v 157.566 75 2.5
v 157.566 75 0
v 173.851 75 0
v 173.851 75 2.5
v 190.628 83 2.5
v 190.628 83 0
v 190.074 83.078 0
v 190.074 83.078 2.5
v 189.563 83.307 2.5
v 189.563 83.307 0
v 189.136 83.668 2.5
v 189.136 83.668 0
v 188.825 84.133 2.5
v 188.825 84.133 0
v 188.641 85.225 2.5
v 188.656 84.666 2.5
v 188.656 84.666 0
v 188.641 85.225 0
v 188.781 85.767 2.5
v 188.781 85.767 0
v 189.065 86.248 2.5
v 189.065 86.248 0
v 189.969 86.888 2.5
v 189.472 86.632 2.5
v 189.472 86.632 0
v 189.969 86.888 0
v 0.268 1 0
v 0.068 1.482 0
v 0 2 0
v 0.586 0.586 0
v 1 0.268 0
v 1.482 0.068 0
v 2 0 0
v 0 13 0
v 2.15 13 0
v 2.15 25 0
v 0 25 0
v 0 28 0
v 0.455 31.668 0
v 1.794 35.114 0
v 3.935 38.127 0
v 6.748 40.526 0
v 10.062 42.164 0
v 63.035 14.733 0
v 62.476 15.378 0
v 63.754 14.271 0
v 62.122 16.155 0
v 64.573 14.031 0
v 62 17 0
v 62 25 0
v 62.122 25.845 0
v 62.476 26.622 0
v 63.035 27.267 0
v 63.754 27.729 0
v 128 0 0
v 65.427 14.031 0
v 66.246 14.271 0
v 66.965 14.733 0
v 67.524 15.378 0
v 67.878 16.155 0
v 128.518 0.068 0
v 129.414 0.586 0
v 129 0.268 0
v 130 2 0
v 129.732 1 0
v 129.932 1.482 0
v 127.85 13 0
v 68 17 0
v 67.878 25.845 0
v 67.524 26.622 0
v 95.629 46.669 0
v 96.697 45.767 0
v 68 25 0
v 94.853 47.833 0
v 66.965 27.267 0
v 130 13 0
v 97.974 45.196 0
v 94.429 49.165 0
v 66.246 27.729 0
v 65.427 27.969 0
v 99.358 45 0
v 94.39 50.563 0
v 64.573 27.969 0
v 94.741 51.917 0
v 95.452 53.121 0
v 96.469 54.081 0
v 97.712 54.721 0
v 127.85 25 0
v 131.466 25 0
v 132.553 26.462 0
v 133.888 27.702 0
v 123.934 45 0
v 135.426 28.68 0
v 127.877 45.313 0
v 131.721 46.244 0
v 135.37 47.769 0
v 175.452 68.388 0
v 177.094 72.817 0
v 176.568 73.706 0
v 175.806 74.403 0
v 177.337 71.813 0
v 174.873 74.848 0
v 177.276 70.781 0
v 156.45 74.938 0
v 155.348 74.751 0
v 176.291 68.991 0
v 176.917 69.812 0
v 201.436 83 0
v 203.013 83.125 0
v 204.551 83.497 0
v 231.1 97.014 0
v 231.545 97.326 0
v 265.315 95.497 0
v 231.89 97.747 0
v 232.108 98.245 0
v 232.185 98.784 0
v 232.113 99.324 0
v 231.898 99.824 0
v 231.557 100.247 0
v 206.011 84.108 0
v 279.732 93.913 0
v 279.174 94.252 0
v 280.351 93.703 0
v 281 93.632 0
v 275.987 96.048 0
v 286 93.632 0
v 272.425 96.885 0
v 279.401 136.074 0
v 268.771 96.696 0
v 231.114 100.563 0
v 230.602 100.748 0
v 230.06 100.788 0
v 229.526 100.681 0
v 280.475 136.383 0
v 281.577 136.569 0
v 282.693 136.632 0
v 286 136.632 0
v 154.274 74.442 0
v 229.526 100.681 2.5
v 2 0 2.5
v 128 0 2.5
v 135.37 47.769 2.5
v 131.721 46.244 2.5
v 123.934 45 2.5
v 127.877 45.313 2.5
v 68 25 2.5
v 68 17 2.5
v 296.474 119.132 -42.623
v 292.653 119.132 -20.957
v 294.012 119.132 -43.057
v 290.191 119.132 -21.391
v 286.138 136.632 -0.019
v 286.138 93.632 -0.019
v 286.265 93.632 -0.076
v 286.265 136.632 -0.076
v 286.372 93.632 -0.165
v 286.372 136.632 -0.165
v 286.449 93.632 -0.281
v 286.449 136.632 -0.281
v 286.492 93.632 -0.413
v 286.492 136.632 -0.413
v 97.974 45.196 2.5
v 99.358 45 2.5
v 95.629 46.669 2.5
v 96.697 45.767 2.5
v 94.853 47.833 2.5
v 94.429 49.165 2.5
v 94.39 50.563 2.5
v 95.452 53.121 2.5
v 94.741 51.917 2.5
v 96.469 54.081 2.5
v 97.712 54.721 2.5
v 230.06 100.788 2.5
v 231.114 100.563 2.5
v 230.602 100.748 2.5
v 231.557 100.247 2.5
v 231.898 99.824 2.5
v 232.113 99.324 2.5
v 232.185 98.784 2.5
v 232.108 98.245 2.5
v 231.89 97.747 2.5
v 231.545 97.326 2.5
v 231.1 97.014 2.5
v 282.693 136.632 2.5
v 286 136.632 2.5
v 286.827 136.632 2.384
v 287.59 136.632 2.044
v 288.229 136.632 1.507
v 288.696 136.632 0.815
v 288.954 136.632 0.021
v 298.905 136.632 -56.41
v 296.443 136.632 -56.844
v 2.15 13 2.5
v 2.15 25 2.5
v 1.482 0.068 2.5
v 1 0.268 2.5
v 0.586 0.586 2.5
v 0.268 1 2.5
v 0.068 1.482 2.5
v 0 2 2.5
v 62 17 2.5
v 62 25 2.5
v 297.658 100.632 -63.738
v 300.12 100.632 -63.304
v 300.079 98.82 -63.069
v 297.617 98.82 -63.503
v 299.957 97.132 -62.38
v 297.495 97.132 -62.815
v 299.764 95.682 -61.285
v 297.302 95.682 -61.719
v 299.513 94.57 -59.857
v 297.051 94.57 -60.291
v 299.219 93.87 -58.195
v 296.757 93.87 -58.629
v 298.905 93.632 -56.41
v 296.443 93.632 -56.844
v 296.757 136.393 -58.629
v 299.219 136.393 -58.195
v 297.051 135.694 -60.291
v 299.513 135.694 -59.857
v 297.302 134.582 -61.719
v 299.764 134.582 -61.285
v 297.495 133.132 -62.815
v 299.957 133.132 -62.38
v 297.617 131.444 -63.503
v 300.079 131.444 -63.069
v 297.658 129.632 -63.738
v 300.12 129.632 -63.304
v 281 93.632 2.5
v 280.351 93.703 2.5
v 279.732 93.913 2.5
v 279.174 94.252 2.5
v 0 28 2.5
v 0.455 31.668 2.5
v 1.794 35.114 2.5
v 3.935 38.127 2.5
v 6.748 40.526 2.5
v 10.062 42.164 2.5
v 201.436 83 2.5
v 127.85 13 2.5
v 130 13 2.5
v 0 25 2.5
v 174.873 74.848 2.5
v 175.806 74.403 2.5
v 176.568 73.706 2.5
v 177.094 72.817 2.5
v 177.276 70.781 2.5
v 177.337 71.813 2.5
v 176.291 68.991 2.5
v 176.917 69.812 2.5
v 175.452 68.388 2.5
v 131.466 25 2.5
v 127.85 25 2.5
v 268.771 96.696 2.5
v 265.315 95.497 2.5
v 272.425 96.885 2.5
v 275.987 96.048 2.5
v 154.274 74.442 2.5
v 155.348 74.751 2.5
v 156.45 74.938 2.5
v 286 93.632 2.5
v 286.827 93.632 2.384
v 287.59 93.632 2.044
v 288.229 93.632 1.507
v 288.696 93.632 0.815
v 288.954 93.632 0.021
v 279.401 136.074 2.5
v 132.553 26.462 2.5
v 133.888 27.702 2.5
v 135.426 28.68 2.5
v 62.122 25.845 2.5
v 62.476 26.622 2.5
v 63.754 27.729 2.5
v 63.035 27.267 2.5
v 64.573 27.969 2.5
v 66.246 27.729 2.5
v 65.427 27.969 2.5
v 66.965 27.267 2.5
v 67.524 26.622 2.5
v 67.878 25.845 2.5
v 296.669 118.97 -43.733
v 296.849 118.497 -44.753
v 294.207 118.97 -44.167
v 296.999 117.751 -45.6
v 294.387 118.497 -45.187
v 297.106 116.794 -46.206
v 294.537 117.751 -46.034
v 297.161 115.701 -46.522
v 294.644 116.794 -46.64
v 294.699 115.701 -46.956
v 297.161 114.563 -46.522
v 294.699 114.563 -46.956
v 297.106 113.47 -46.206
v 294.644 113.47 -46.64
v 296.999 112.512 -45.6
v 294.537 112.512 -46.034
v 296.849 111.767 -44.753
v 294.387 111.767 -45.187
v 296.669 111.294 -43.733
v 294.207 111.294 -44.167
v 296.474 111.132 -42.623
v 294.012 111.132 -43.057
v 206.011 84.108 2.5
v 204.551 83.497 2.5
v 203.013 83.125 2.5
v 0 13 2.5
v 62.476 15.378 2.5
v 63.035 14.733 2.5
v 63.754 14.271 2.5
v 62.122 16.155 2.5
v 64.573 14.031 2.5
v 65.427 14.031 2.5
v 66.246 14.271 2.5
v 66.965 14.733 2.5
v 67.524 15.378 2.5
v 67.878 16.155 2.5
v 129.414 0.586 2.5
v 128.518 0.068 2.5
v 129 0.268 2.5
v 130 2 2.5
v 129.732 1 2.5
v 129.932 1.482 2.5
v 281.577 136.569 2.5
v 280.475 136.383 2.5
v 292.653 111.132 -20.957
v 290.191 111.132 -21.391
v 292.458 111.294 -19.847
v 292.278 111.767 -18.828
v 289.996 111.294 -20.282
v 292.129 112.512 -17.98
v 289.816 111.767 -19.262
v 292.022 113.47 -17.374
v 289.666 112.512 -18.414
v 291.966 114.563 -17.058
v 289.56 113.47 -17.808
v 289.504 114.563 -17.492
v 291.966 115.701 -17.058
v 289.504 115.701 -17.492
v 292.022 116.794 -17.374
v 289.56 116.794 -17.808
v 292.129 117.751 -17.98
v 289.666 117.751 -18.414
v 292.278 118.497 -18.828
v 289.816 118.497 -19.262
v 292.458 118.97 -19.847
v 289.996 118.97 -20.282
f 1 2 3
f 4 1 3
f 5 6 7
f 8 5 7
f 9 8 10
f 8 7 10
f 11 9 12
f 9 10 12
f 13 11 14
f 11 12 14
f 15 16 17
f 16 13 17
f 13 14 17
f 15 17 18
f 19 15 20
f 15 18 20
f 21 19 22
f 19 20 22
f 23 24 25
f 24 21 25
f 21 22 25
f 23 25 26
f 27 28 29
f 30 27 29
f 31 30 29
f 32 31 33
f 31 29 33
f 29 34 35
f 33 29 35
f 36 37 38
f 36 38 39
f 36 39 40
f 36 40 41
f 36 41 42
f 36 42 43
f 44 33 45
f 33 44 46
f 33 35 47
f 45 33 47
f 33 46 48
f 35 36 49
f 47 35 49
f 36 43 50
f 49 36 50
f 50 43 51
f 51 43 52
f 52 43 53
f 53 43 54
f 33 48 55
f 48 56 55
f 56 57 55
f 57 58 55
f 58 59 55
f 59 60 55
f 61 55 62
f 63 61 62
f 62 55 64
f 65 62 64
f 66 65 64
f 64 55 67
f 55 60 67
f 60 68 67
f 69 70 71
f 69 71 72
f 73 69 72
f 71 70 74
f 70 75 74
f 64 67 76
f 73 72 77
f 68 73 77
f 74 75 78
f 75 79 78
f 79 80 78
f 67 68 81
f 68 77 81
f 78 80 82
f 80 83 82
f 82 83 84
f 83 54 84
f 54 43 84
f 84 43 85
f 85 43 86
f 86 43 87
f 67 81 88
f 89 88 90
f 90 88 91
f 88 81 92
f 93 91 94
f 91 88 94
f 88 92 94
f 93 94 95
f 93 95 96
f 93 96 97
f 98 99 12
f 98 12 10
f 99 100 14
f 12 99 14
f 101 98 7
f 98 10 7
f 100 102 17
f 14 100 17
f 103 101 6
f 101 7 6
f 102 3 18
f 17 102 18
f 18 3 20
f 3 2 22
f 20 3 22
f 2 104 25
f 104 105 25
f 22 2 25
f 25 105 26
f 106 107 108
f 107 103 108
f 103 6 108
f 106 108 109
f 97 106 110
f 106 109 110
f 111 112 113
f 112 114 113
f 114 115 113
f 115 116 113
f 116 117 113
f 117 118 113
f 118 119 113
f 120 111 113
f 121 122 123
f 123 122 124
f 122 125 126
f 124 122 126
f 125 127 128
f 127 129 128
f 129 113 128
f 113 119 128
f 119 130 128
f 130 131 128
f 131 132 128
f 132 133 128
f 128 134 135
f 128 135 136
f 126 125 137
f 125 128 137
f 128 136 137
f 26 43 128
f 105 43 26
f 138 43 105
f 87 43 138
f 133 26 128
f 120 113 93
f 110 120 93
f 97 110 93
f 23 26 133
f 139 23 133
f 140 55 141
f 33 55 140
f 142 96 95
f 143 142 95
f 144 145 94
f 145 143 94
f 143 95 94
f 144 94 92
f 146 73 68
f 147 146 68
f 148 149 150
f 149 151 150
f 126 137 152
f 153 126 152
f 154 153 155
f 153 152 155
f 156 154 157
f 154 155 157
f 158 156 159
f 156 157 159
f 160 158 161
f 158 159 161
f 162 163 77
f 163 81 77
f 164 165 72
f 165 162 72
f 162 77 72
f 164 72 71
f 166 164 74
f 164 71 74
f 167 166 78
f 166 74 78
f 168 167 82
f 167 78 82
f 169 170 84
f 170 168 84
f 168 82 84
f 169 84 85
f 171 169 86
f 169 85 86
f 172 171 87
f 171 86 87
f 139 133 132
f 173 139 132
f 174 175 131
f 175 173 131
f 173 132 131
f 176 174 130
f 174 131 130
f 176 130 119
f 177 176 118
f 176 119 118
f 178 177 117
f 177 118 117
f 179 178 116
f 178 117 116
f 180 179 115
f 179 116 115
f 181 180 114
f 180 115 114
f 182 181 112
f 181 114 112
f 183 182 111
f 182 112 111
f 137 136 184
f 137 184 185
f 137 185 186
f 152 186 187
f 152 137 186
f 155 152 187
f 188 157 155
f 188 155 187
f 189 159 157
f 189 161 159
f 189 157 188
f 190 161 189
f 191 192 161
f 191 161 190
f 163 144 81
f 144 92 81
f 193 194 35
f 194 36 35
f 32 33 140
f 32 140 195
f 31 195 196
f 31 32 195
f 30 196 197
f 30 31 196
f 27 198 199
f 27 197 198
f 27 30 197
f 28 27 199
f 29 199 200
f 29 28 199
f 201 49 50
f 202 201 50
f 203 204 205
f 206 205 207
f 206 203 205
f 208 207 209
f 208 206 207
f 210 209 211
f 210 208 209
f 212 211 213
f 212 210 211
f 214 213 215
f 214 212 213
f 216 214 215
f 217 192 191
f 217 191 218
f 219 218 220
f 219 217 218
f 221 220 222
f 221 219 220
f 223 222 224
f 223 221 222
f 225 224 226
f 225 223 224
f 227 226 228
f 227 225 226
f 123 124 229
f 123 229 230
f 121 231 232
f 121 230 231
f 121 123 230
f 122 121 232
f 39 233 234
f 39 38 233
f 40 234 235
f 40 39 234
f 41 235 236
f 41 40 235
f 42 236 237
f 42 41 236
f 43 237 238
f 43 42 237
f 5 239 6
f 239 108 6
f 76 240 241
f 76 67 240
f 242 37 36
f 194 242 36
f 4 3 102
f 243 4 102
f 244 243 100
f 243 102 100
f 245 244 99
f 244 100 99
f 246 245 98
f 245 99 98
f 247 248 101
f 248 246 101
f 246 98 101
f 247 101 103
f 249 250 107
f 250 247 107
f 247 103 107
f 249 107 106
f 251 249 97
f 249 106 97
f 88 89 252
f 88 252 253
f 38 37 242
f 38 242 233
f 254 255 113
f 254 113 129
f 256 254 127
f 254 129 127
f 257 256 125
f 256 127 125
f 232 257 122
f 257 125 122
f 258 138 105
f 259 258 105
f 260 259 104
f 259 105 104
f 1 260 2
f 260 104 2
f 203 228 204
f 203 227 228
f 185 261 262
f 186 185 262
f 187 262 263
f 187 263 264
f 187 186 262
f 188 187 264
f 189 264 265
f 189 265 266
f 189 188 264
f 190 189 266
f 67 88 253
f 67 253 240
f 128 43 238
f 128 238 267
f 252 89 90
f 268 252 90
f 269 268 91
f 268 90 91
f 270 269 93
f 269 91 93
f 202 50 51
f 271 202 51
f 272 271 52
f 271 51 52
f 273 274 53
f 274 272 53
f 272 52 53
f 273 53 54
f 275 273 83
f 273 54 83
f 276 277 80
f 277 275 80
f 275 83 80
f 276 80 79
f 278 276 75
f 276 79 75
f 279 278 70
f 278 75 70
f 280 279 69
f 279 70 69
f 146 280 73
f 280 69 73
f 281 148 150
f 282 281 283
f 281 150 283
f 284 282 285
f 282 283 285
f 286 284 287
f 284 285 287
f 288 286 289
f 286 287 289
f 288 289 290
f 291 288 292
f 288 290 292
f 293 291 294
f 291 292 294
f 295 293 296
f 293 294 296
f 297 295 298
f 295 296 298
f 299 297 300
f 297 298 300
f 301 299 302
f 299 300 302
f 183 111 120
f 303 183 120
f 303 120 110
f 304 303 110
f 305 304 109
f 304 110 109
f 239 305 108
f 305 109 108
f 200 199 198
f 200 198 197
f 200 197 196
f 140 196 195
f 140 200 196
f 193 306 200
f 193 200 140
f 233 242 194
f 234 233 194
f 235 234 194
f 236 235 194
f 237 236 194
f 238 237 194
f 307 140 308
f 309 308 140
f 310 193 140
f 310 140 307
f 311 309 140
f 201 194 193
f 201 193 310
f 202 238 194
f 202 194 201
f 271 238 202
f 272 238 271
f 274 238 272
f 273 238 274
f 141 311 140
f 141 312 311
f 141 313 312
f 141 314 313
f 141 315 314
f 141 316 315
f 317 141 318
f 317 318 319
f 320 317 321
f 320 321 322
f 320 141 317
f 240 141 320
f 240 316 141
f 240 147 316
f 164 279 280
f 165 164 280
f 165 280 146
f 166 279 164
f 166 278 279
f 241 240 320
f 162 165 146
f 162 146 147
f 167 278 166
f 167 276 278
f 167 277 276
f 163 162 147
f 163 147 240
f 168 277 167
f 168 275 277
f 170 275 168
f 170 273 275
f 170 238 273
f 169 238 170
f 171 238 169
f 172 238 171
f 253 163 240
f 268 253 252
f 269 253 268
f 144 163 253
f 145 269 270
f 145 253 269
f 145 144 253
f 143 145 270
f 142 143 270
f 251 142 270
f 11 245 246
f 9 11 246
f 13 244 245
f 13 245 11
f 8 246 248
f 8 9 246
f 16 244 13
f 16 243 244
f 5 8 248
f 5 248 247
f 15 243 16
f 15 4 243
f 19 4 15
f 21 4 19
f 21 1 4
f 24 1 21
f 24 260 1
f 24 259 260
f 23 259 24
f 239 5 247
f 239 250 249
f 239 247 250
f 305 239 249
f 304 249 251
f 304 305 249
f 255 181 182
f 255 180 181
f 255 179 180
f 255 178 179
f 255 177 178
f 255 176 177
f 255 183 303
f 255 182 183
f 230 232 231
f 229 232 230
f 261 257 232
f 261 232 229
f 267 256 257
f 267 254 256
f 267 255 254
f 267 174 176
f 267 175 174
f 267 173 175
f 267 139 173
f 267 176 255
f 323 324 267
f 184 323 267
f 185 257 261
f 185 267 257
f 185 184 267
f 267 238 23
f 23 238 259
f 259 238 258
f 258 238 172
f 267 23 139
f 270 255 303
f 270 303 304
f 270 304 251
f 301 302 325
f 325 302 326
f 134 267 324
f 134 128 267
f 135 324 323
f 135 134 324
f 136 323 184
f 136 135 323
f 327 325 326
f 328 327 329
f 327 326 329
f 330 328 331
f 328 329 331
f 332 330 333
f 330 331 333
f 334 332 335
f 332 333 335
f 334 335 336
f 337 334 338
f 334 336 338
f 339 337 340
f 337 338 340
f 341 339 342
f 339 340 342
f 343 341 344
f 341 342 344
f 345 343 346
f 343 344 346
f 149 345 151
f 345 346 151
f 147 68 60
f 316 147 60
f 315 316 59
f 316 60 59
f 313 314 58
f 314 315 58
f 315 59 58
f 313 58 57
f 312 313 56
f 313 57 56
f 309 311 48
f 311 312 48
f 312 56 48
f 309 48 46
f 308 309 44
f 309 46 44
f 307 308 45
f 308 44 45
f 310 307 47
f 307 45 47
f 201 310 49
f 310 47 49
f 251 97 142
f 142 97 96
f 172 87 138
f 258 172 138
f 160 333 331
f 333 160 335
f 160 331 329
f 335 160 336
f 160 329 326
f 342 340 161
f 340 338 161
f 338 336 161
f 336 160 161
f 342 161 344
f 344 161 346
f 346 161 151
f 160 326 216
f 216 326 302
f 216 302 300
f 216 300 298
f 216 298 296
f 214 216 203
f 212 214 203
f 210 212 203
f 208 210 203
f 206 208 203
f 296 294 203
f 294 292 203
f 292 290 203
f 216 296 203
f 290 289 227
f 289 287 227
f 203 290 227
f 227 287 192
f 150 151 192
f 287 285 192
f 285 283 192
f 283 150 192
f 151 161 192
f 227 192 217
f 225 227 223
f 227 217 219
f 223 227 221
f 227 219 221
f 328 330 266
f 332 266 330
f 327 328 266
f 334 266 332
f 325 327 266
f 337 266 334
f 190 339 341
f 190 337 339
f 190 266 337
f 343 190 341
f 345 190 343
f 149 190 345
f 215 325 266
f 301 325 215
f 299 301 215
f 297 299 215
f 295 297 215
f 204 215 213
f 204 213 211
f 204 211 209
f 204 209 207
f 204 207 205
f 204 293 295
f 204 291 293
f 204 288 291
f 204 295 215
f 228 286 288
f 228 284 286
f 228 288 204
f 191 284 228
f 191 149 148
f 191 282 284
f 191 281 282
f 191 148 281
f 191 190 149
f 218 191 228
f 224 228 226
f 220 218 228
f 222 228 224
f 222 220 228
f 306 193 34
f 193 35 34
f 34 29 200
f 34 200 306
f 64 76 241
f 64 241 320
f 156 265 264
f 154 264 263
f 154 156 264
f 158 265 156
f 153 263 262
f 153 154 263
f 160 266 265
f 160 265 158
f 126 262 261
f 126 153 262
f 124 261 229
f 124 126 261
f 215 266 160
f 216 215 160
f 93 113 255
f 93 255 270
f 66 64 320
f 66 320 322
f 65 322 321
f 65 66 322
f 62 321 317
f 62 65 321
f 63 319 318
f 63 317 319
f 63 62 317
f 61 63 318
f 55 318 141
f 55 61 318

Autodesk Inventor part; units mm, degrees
ref_plane "YZ Plane" through (0, 0, 0) normal (1, 0, 0) x (0, 1, 0)
ref_plane "XZ Plane" through (0, 0, 0) normal (0, 1, 0) x (-1, 0, 0)
sketch "草圖1" plane through (0, 0, 0) normal (0, 0, 1) x (1, 0, 0)
  line L0 (0, 0) -> (-7.8042, 0) construction
  line L1 (0, 0) -> (0, -16.694) construction
  line L2 (0, 2) -> (0, 13)
  line L3 (286, 136.6319) -> (286, 93.6319)
  line L4 (130, 19.7875) -> (130, 13) construction
  line L5 (128, 0) -> (2, 0)
  line L6 (286, 136.6319) -> (344, 136.6319)
  line L7 (351, 129.6319) -> (351, 100.6319)
  line L8 (344, 93.6319) -> (286, 93.6319)
  line L9 (308, 119.1319) -> (330, 119.1319)
  arc A0 (330, 111.1319) -> (330, 119.1319) centre (330, 115.1319) ccw
  line L10 (330, 111.1319) -> (308, 111.1319)
  arc A1 (308, 119.1319) -> (308, 111.1319) centre (308, 115.1319) ccw
  arc A2 (10.0615, 42.1637) -> (0, 28) centre (15, 28) ccw
  line L11 (10.0615, 42.1637) -> (279.401, 136.0744)
  line L12 (282.6934, 136.6319) -> (286, 136.6319)
  line L13 (286, 93.6319) -> (281, 93.6319)
  line L14 (265.3146, 95.4972) -> (135.4256, 28.6799)
  arc A3 (351, 129.6319) -> (344, 136.6319) centre (344, 129.6319) ccw
  arc A4 (344, 93.6319) -> (351, 100.6319) centre (344, 100.6319) ccw
  arc A5 (279.174, 94.2516) -> (281, 93.6319) centre (281, 96.6319) ccw
  arc A6 (279.174, 94.2516) -> (265.3146, 95.4972) centre (271.2613, 83.9371) ccw
  arc A7 (282.6934, 136.6319) -> (279.401, 136.0744) centre (282.6934, 126.6319) ccw
  arc A8 (135.4256, 28.6799) -> (131.466, 25) centre (140, 19.7875) ccw
  line L15 (0, 25) -> (2.15, 25)
  line L16 (2.15, 25) -> (2.15, 13)
  line L17 (2.15, 13) -> (0, 13)
  line L18 (0, 13) -> (0, 25) construction
  line L19 (65, 0) -> (65, 25) construction
  line L20 (131.466, 25) -> (127.85, 25)
  line L21 (127.85, 25) -> (127.85, 13)
  line L22 (127.85, 13) -> (130, 13)
  line L23 (130, 13) -> (130, 19.7875) construction
  arc A9 (0, 2) -> (2, 0) centre (2, 2) ccw
  arc A10 (128, 0) -> (130, 2) centre (128, 2) ccw
  line L24 (0, 13) -> (0, 25) construction
  line L25 (0, 25) -> (0, 28)
  line L26 (130, 19.7875) -> (130, 25) construction
  line L27 (130, 13) -> (130, 2)
  line L28 (123.9345, 45) -> (99.3585, 45)
  line L29 (157.566, 75) -> (173.8509, 75)
  line L30 (97.7123, 54.7212) -> (154.2737, 74.4425)
  line L31 (175.452, 68.3877) -> (135.3705, 47.769)
  arc A11 (175.452, 68.3877) -> (173.8509, 75) centre (173.8509, 71.5) ccw
  arc A12 (97.7123, 54.7212) -> (99.3585, 45) centre (99.3585, 50) ccw
  arc A13 (123.9345, 45) -> (135.3705, 47.769) centre (123.9345, 70) ccw
  arc A14 (157.566, 75) -> (154.2737, 74.4425) centre (157.566, 65) ccw
  line L32 (189.9693, 86.8885) -> (229.5263, 100.6808)
  line L33 (231.0996, 97.0139) -> (206.0106, 84.1076)
  line L34 (201.4362, 83) -> (190.6278, 83)
  arc A15 (231.0996, 97.0139) -> (229.5263, 100.6808) centre (230.1847, 98.7923) ccw
  arc A16 (201.4362, 83) -> (206.0106, 84.1076) centre (201.4362, 93) ccw
  arc A17 (189.9693, 86.8885) -> (190.6278, 83) centre (190.6278, 85) ccw
  arc A18 (131.466, 25) -> (130, 19.7875) centre (140, 19.7875) ccw construction
  line L35 (68, 25) -> (68, 17)
  arc A19 (62, 17) -> (68, 17) centre (65, 17) ccw
  line L36 (62, 17) -> (62, 25)
  arc A20 (68, 25) -> (62, 25) centre (65, 25) ccw
  point P0 (130, 0)
  point P1 (351, 136.6319)
  point P2 (351, 93.6319)
  point P3 (130, 25.8889)
  point P4 (281, 136.6319)
  point P5 (281, 93.6319)
  point P6 (281, 103.5661)
  point P7 (0, 10.2)
  point P8 (130, 28)
  point P9 (130, 10.2)
  dimension "d0" = 130
  dimension "d1" = 136.6319
  dimension "d2" = 43
  dimension "d3" = 65
  dimension "d4" = 8
  dimension "d5" = 30
  dimension "d7" = 18
  dimension "d8" = 286
  dimension "d17" = 21.5
  dimension "d20" = 15
  dimension "d21" = 28
  dimension "d23" = 5
  dimension "d24" = 7
  dimension "d26" = 3
  dimension "d29" = 13
  dimension "d30" = 5
  dimension "d31" = 10
  dimension "d32" = 10
  dimension "d33" = 8
  dimension "d39" = 12
  dimension "d41" = 13
  dimension "d42" = 2
  dimension "d45" = 45
  dimension "d46" = 17
  dimension "d47" = 17
  dimension "d48" = 30
  dimension "d49" = 3.5
  dimension "d50" = 5
  dimension "d51" = 25
  dimension "d52" = 10
  dimension "d53" = 8
  dimension "d54" = 2
  dimension "d55" = 10
  dimension "d56" = 2
  dimension "d57" = 19.7875
  dimension "d60" = 6
  dimension "d61" = 8
  dimension "d63" = 17
  dimension "d64" = 19.222
  dimension "d65" = 125.7
extrude "擠出1" add sketch "草圖1" along normal blind 2.5
bend part "折彎零件1" radius 0.5 angle 80 line through (286, 136.6319, 0) along (0, -1, 0) centre toward (0, 0, -1) moving side (1, 0, 0) both sides no
ref_plane "工作平面1" through (65, 2, 0) normal (-1, 0, 0) x (0, 0, 1)
properties part number "0 零件" material "不鏽鋼SUS-HL(砂紋)"
